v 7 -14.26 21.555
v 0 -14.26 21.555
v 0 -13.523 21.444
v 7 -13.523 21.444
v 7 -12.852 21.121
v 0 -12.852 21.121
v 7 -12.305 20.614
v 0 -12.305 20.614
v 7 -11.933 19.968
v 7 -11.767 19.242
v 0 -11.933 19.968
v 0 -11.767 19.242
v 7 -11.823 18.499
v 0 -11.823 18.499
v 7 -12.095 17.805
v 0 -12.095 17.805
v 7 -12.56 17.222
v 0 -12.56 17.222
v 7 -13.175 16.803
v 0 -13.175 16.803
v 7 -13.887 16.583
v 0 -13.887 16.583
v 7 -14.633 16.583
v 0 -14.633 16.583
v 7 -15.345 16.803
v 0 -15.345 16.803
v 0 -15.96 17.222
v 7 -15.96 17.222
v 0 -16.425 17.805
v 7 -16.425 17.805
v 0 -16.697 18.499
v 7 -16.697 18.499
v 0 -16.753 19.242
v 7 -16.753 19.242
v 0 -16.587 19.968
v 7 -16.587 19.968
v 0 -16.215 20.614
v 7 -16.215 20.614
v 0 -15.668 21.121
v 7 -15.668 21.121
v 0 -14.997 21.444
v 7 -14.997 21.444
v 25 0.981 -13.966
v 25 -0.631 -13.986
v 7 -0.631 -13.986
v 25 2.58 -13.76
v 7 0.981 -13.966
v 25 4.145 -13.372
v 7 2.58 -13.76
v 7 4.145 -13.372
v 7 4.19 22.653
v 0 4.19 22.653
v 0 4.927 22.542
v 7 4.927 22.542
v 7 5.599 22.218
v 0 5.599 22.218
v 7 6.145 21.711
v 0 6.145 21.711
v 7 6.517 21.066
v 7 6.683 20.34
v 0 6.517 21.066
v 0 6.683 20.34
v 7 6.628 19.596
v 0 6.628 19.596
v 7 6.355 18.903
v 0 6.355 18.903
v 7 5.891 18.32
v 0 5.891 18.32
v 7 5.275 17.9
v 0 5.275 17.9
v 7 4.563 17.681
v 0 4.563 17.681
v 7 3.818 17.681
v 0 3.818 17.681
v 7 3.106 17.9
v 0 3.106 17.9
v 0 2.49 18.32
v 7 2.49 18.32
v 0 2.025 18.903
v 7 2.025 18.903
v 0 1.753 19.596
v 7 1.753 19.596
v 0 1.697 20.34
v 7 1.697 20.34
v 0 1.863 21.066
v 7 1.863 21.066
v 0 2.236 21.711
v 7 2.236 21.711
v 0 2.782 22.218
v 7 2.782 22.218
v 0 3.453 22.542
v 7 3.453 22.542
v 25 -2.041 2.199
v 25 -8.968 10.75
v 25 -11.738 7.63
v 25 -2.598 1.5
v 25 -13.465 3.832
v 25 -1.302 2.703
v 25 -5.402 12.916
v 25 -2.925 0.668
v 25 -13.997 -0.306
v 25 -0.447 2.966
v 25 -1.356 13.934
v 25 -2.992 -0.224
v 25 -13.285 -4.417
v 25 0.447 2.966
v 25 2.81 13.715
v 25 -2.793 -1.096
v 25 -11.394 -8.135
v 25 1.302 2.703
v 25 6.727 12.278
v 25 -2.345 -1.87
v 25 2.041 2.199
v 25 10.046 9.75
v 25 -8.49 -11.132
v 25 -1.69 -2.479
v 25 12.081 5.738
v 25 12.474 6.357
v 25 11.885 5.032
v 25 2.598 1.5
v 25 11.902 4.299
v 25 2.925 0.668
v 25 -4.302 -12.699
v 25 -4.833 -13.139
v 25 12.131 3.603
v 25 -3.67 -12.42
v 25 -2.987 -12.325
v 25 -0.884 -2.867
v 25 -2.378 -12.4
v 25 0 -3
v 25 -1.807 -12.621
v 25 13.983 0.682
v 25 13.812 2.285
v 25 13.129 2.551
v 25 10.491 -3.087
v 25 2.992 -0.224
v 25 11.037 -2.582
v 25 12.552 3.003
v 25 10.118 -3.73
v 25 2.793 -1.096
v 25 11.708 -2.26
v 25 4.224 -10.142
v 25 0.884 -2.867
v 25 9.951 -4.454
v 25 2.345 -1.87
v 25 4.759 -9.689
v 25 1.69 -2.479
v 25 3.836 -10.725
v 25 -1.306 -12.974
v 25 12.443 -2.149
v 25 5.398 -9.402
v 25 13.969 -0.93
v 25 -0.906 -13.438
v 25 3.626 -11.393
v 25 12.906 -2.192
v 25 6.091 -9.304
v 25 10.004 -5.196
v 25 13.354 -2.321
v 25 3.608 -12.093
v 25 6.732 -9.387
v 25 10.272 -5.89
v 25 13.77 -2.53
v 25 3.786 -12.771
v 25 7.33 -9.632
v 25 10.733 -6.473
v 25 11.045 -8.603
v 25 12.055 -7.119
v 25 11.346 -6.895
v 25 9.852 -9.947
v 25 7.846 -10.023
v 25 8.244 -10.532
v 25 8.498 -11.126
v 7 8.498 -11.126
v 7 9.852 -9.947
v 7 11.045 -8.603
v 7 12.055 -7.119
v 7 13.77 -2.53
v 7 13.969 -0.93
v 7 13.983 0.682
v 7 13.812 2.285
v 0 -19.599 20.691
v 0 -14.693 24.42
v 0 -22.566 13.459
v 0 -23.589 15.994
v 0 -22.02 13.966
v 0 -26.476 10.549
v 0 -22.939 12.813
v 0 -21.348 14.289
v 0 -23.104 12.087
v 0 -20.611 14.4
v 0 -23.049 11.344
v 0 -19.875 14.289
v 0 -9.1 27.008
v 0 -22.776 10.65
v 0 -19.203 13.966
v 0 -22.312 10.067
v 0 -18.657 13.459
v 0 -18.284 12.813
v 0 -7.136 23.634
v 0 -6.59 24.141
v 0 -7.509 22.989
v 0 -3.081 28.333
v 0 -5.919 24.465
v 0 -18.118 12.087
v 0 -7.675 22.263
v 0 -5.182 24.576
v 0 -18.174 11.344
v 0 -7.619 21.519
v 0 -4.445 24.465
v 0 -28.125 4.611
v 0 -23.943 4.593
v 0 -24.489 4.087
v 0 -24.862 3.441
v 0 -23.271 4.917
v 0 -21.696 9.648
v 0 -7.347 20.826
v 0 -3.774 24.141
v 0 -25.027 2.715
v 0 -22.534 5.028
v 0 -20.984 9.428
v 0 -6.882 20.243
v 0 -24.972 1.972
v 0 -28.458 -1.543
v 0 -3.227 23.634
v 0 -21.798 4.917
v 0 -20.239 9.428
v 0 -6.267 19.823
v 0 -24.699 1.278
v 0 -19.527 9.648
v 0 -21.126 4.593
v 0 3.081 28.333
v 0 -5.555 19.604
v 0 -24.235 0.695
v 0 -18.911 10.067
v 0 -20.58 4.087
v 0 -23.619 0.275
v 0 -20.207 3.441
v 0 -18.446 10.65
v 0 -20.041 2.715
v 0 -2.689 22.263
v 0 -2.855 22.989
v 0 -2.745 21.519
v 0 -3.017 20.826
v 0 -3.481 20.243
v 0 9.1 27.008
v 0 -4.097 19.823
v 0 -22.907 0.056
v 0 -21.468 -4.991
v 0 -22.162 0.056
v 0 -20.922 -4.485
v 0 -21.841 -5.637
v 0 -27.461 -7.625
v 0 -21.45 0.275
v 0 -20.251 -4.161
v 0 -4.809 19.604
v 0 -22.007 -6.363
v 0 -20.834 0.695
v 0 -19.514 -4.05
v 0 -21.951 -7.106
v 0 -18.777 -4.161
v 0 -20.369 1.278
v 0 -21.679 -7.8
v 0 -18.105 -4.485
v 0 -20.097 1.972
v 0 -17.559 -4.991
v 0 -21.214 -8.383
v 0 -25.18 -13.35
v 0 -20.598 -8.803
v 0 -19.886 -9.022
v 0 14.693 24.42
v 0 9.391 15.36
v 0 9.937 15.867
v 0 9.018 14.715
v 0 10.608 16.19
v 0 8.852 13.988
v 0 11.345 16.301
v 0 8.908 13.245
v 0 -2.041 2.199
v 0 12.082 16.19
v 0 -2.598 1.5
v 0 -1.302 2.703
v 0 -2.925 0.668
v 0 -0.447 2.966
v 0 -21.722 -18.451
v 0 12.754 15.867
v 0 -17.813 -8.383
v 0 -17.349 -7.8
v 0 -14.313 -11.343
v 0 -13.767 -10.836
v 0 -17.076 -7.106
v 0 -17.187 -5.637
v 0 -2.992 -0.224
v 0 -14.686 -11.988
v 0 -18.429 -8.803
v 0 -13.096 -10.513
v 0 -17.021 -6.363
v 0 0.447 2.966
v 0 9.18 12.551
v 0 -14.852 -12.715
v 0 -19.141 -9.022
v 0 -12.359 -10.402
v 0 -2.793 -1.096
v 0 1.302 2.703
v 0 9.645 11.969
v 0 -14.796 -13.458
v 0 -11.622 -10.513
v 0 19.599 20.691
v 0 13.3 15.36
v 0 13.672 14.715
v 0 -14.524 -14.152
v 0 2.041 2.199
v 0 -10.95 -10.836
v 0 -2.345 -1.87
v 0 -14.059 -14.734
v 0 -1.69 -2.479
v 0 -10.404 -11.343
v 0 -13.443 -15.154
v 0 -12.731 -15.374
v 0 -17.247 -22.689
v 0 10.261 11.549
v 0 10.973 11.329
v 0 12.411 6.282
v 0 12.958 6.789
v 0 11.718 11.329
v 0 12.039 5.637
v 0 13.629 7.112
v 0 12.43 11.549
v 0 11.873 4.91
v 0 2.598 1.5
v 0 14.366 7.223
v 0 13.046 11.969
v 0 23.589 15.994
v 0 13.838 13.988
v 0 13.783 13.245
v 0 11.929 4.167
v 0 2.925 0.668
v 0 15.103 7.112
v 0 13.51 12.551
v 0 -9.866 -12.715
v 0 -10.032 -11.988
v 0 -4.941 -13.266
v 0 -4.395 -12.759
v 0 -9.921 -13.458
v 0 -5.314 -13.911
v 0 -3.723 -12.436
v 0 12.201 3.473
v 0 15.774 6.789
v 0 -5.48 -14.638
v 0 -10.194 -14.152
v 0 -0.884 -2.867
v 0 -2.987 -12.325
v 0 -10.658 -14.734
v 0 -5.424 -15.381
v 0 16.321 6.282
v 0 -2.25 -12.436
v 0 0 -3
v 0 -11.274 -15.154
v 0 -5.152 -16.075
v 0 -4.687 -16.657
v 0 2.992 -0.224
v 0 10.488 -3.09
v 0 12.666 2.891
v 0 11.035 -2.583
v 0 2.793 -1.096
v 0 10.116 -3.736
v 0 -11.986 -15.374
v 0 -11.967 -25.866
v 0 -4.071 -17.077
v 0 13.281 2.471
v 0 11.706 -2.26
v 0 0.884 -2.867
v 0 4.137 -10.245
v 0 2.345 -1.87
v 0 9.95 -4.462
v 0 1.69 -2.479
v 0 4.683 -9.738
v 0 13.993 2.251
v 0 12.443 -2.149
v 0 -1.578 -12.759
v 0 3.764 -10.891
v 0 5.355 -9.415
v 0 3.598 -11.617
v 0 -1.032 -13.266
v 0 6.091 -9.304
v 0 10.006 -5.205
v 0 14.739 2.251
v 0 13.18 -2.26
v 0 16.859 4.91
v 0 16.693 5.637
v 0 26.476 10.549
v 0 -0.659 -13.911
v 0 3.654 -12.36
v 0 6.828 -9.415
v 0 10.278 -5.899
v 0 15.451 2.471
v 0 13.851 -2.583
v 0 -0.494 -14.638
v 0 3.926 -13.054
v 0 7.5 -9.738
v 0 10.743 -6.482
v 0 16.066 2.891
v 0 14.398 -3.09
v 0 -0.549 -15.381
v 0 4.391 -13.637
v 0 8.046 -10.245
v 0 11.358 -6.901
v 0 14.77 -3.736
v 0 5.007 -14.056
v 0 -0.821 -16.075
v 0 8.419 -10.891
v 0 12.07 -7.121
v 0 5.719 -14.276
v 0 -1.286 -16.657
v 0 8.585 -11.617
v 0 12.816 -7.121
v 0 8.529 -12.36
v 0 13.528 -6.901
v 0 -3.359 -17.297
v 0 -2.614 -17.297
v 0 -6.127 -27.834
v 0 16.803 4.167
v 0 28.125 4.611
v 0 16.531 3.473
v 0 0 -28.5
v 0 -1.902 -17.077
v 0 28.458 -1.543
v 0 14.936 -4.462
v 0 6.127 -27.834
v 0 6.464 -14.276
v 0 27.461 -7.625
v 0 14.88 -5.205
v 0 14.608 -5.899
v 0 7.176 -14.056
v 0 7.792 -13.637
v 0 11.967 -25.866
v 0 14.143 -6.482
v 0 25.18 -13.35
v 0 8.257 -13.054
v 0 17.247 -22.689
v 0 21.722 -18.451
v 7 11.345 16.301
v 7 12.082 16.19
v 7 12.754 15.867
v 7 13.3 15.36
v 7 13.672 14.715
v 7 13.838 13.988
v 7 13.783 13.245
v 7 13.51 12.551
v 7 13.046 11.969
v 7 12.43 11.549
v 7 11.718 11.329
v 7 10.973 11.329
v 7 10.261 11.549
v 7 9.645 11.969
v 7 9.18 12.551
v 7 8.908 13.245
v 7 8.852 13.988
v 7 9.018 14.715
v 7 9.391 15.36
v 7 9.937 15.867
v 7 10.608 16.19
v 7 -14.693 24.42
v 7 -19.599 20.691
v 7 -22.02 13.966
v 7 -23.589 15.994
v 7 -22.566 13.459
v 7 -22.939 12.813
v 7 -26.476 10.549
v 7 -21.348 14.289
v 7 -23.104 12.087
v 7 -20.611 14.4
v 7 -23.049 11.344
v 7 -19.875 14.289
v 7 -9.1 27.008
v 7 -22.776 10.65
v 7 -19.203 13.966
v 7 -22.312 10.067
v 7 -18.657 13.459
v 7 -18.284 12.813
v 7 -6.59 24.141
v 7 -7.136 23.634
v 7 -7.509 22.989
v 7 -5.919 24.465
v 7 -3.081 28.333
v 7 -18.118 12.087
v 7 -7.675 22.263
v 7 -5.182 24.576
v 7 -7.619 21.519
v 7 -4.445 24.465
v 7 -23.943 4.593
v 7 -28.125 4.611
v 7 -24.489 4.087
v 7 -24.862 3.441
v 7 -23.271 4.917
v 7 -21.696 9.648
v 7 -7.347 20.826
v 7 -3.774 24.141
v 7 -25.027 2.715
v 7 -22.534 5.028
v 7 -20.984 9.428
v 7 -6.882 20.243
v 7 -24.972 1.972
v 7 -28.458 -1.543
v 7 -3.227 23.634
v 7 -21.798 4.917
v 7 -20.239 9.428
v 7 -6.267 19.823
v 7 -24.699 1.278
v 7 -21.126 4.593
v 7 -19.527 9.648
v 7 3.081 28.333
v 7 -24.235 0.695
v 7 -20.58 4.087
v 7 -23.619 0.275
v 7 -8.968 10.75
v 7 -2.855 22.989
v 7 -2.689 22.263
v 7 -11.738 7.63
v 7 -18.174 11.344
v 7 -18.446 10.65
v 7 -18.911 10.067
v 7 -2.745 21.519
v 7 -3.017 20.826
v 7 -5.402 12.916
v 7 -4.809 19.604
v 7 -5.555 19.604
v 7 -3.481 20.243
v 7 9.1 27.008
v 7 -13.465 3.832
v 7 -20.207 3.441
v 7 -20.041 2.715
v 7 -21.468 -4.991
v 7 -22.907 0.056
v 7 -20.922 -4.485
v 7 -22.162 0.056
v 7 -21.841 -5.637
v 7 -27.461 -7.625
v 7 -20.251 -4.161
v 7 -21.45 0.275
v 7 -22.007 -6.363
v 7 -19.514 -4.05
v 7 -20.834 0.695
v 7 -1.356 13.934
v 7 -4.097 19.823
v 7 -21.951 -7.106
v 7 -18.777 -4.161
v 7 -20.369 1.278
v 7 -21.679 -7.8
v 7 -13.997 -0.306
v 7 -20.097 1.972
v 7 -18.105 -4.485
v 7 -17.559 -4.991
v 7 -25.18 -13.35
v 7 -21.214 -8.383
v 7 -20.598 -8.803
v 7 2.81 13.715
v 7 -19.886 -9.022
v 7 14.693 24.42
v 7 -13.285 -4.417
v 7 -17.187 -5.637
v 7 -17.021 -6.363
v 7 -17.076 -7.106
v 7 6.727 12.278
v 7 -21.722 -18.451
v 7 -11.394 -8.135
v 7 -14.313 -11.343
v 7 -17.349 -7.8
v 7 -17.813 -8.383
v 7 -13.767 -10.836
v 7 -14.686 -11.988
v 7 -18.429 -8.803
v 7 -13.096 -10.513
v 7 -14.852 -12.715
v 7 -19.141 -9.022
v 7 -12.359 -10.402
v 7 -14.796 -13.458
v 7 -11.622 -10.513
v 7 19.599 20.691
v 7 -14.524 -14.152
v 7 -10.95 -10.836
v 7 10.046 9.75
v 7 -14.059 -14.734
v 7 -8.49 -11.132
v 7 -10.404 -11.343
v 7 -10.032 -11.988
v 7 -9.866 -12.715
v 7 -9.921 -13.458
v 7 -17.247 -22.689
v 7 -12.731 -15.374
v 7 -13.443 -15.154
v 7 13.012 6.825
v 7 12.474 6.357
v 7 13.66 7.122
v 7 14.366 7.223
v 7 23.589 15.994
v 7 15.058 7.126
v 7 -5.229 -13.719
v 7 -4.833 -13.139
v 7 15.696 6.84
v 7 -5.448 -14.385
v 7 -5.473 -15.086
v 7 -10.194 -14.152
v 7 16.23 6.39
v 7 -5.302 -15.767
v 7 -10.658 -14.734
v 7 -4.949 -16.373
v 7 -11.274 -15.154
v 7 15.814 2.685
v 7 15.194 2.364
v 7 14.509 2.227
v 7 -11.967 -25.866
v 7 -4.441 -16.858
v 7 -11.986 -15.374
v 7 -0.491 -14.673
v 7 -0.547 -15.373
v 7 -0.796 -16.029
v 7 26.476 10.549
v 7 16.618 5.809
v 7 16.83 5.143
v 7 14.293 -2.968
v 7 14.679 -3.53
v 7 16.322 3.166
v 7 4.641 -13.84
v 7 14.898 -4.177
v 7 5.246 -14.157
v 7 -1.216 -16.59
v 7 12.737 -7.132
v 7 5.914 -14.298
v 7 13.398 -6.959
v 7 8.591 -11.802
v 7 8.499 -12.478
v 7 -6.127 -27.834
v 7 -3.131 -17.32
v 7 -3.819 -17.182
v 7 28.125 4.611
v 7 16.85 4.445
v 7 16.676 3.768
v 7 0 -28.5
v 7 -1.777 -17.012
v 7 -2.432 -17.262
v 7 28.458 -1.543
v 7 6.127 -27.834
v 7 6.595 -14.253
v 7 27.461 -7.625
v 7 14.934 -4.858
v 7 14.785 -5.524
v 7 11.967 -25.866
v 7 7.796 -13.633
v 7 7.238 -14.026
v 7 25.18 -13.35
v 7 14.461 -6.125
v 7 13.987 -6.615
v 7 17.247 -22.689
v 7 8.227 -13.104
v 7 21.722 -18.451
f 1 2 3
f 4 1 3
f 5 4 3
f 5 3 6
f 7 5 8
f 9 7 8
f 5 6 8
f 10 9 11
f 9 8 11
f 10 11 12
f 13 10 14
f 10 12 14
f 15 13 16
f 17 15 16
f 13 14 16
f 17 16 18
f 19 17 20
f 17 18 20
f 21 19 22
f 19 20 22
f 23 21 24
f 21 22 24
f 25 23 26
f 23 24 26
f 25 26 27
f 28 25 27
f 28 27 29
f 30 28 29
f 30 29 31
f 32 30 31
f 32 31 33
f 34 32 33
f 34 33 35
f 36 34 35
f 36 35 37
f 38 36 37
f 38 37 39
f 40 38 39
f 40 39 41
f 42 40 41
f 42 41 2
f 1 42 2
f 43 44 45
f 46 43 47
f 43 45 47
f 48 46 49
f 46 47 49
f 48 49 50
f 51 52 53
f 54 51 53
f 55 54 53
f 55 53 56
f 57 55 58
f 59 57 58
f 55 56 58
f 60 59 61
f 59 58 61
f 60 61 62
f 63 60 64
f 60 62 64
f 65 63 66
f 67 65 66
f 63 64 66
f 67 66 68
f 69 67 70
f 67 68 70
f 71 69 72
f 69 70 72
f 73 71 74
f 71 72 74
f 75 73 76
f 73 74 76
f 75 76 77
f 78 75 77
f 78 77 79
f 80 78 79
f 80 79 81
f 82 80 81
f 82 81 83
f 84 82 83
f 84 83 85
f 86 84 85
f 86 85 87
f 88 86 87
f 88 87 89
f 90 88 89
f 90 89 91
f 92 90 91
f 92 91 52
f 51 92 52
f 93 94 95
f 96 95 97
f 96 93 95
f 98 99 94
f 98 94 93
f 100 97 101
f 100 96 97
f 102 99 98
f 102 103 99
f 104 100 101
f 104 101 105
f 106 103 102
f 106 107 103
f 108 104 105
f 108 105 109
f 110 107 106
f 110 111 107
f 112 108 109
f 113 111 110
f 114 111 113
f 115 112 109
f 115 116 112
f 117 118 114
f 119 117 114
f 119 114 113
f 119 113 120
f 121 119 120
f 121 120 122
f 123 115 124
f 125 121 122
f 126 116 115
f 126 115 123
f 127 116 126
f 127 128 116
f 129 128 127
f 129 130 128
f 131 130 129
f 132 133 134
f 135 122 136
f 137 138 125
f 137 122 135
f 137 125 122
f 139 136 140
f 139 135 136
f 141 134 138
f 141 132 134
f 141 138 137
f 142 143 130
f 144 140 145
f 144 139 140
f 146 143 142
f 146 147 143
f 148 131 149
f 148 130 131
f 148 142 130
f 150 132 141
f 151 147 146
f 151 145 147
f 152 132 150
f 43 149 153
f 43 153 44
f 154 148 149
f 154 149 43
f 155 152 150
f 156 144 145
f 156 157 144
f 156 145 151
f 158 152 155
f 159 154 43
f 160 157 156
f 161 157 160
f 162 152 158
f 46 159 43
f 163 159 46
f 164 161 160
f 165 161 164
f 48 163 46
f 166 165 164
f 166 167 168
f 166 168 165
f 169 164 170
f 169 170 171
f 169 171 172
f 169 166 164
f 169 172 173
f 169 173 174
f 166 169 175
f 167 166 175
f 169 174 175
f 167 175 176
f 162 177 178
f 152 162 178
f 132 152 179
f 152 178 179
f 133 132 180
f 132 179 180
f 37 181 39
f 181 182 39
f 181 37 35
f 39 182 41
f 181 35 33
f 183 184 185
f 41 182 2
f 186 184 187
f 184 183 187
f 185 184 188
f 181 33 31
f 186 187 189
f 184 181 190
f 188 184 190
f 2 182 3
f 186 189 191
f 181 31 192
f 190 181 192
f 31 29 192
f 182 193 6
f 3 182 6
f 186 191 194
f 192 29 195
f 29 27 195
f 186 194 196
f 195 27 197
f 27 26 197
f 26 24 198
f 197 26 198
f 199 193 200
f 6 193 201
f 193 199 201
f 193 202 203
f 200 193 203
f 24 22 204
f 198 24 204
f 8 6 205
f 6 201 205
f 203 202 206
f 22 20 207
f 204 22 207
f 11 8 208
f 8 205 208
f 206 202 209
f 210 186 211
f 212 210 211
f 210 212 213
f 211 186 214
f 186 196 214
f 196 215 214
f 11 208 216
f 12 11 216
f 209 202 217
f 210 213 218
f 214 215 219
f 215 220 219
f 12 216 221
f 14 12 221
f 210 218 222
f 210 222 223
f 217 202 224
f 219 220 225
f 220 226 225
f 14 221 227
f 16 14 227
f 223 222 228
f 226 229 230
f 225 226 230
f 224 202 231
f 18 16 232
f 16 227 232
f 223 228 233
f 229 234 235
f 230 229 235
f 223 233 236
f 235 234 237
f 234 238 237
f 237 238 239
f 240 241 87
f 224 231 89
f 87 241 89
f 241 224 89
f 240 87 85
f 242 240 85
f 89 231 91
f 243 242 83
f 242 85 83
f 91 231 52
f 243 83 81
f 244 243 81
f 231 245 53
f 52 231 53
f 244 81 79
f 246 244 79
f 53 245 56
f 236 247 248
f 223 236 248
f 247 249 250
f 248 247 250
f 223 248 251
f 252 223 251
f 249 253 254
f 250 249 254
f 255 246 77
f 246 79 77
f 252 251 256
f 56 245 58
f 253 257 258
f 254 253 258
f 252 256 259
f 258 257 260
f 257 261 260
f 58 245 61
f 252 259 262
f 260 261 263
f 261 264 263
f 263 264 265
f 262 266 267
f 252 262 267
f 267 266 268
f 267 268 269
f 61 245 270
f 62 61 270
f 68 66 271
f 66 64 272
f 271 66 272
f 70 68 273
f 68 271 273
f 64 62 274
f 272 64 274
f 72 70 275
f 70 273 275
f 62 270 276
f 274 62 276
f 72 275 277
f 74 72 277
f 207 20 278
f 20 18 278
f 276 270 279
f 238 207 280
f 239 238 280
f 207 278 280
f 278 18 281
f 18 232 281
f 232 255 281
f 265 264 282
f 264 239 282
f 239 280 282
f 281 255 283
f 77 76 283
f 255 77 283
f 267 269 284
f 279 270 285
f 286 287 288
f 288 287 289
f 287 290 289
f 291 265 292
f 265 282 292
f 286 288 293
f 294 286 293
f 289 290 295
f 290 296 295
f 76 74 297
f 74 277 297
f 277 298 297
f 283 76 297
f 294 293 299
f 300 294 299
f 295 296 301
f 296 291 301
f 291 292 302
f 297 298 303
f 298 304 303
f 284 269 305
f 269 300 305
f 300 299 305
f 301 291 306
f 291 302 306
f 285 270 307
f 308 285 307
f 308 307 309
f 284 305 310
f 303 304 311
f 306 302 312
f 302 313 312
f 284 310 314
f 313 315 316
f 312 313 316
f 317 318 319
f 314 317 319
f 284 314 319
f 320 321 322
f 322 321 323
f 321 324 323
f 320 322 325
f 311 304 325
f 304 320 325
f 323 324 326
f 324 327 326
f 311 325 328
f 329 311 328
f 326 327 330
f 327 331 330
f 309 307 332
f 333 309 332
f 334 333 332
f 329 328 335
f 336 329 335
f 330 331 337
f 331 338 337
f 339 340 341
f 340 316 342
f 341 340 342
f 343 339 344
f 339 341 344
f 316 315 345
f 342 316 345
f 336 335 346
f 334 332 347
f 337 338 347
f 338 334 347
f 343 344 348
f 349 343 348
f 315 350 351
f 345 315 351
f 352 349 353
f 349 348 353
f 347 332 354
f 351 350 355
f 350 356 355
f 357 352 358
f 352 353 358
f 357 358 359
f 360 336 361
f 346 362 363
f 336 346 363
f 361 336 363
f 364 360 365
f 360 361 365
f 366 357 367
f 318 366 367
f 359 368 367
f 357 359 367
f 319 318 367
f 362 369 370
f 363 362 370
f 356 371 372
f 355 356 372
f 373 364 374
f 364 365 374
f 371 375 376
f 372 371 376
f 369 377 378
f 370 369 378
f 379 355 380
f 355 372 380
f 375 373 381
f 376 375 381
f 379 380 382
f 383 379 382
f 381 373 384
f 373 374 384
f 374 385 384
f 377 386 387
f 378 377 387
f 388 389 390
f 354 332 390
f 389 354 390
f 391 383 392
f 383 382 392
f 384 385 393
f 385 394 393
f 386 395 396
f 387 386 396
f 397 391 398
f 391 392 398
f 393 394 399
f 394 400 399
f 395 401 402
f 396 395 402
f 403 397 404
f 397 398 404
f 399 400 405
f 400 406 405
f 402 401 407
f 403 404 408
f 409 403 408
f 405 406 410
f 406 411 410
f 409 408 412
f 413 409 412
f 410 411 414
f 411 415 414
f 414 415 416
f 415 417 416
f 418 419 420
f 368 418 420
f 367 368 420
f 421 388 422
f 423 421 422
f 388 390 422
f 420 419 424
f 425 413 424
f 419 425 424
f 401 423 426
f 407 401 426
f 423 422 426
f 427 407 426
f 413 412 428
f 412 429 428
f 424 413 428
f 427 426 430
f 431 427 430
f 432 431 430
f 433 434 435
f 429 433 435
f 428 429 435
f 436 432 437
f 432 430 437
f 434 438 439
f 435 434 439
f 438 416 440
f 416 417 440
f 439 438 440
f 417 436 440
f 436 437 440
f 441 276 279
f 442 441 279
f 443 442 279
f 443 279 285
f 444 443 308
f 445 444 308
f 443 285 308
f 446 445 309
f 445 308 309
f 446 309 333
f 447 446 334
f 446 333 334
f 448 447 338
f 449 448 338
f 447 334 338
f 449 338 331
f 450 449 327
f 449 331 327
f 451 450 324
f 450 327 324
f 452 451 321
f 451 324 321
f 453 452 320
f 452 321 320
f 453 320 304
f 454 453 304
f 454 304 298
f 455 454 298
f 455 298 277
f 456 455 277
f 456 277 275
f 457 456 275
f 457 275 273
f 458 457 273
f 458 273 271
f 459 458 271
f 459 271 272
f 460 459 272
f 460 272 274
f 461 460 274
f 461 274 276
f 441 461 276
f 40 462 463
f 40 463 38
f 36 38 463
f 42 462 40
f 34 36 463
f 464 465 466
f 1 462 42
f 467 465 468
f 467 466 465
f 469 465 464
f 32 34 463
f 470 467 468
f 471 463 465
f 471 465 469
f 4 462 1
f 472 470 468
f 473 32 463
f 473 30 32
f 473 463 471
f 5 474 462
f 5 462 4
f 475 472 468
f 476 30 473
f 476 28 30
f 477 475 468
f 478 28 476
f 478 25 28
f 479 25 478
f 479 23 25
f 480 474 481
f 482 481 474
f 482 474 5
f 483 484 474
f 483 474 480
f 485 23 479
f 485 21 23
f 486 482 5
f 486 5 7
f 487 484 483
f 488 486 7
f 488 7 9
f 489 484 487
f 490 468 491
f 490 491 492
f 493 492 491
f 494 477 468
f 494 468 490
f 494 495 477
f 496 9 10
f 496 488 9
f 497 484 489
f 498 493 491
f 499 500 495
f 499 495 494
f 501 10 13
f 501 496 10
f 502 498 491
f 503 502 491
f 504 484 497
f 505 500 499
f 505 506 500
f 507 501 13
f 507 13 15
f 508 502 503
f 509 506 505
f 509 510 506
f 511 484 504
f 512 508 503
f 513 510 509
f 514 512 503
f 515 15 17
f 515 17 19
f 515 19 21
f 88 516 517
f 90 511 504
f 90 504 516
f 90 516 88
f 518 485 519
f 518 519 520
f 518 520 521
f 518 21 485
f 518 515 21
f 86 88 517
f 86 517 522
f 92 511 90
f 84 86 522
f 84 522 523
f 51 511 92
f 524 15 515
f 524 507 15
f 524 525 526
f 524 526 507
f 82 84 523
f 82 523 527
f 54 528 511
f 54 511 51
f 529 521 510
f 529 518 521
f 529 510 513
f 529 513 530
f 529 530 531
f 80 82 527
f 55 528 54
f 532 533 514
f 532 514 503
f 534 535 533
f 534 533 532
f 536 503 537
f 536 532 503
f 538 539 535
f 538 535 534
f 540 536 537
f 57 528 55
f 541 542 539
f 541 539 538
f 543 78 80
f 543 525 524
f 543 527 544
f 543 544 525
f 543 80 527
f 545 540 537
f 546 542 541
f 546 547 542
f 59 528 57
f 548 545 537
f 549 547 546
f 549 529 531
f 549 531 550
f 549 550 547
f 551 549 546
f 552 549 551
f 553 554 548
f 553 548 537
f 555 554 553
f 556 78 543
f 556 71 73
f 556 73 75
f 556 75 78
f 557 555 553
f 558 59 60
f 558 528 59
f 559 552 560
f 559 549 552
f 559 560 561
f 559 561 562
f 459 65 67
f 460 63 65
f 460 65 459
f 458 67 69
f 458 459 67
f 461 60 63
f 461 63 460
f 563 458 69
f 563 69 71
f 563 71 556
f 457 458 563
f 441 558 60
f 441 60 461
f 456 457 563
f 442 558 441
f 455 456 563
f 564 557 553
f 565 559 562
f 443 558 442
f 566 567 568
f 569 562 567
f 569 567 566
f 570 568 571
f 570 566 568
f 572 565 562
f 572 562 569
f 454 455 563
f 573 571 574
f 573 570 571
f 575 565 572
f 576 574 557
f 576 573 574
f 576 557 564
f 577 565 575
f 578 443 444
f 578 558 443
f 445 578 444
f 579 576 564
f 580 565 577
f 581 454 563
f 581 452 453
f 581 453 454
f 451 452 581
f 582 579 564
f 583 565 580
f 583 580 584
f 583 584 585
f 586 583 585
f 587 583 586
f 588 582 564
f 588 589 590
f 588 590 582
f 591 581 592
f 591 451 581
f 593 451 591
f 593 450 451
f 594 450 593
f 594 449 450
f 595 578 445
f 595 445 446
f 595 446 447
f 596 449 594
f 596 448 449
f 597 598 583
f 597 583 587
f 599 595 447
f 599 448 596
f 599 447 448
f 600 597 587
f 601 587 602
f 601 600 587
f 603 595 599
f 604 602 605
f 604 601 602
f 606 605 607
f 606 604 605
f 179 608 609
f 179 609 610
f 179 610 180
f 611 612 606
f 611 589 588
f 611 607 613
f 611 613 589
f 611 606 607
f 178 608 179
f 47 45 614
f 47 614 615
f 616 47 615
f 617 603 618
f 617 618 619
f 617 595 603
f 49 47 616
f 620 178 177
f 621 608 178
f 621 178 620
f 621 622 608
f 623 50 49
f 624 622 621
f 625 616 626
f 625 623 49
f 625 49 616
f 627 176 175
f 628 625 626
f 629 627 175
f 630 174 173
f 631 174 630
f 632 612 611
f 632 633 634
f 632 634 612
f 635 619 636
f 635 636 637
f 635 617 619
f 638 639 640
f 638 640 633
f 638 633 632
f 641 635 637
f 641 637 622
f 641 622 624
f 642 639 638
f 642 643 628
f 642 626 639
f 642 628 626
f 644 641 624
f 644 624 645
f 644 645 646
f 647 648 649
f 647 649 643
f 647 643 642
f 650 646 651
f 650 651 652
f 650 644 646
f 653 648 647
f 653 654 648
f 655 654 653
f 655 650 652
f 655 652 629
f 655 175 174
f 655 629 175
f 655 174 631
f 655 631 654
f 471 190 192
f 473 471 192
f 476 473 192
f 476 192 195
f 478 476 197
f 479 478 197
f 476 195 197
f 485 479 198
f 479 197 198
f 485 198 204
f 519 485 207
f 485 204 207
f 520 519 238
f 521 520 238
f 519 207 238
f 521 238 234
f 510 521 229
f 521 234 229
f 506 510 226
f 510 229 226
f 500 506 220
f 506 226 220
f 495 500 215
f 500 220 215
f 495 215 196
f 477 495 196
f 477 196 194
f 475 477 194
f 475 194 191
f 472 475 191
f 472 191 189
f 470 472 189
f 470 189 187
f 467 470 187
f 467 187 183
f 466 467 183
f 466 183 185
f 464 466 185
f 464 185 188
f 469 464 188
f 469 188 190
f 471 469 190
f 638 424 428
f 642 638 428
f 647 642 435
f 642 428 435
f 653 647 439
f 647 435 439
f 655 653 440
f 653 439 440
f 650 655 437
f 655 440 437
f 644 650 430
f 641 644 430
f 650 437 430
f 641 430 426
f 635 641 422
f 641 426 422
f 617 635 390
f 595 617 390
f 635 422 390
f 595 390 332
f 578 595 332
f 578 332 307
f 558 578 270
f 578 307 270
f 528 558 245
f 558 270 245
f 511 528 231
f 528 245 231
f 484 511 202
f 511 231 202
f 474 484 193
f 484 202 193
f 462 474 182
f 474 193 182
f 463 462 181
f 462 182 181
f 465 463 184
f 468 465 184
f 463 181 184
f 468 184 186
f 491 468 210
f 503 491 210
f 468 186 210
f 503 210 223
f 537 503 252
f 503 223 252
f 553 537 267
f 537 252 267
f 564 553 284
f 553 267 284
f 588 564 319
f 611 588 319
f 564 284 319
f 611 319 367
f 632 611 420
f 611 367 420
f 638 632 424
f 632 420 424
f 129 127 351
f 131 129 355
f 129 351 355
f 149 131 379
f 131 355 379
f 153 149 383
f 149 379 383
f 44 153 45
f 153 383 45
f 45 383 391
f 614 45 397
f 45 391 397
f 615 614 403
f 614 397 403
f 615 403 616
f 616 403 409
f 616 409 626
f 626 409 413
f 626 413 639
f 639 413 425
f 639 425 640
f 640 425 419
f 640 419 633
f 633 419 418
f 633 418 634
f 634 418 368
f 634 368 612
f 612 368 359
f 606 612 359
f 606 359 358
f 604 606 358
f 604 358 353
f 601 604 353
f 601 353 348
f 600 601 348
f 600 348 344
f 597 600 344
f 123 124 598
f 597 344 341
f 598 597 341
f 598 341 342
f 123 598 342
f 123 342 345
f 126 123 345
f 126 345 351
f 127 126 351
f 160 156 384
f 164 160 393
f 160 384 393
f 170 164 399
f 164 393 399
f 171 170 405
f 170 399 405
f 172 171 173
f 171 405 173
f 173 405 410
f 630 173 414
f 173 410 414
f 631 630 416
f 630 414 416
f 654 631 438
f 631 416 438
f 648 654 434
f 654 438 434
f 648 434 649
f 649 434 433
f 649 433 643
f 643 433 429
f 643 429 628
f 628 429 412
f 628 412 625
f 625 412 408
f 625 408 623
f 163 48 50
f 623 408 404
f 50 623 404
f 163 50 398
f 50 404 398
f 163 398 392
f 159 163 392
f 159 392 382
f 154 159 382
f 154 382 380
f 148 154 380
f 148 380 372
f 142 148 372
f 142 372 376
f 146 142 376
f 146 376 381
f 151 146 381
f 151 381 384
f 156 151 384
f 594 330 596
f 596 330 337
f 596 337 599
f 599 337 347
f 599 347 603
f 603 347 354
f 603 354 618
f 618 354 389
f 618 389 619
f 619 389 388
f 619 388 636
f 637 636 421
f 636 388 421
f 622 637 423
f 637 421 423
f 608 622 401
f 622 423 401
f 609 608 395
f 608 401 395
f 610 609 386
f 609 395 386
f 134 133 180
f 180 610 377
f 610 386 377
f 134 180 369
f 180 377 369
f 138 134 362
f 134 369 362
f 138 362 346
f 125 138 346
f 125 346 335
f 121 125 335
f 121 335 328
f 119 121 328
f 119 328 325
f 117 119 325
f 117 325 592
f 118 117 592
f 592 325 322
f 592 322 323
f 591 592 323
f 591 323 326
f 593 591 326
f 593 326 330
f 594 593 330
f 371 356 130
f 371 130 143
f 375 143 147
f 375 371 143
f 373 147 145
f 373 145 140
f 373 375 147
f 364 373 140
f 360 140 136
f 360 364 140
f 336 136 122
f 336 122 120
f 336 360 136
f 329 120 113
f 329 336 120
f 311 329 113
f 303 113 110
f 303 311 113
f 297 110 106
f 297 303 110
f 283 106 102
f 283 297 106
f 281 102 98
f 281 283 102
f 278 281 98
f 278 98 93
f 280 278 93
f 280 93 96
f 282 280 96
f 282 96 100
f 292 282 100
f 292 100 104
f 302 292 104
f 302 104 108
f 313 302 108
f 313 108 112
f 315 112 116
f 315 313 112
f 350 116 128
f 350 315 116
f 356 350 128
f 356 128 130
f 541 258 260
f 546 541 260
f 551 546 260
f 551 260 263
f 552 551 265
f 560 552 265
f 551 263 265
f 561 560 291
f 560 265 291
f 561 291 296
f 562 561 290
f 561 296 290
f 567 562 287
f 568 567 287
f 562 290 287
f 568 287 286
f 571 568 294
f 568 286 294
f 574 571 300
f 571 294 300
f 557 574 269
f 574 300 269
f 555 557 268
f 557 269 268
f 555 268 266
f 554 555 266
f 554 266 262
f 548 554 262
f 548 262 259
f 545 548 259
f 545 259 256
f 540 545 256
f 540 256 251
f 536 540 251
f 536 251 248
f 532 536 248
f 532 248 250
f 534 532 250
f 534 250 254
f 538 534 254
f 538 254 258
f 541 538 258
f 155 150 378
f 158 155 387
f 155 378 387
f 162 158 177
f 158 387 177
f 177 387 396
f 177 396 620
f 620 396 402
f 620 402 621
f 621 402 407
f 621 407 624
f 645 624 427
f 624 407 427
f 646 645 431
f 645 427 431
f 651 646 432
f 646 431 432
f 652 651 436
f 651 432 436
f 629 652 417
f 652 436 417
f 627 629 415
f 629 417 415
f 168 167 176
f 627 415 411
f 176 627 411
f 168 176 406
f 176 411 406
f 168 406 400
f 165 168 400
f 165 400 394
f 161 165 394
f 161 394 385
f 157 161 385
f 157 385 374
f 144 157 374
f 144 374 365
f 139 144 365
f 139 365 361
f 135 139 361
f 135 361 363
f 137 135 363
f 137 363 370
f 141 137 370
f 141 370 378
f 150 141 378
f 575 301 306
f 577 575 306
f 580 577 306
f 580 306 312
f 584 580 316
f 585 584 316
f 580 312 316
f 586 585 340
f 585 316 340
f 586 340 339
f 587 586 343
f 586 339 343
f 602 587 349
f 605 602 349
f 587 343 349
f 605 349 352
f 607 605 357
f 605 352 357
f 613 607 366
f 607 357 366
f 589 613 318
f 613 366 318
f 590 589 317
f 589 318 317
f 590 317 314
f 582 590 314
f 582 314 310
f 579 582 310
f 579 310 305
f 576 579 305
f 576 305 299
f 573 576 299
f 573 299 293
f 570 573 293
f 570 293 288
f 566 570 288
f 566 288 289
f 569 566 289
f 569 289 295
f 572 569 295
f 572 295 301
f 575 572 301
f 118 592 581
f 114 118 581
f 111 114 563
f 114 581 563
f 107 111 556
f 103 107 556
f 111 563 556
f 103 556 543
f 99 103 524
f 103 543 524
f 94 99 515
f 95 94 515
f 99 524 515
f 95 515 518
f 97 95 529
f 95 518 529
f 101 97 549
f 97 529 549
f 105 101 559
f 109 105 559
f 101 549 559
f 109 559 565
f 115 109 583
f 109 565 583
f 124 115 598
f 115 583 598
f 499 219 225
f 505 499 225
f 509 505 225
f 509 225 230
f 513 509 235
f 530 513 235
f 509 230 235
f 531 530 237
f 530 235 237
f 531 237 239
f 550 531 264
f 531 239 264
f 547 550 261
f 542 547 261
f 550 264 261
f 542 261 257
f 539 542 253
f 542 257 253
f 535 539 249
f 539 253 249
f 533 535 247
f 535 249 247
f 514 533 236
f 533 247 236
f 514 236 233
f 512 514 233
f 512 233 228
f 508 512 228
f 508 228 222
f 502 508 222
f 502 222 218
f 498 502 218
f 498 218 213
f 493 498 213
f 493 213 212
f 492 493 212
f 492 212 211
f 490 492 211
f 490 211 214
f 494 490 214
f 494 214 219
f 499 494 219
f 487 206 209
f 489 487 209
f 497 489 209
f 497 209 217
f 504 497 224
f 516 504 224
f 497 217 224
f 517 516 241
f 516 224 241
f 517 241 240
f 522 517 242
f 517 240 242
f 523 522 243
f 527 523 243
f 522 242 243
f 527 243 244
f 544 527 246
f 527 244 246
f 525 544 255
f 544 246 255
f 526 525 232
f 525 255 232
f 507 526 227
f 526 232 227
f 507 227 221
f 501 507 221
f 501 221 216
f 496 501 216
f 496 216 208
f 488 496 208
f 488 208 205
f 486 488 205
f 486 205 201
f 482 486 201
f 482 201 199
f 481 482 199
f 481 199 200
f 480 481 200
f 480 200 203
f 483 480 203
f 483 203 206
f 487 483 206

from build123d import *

# Parameters (mm, degrees)
SKETCH1_R               = 28.5
SKETCH1_R_2             = 14
BOSS_EXTRUDE1_DEPTH     = 7
SKETCH1_4_R             = 14
SKETCH1_4_R_2           = 3
BOSS_EXTRUDE2_DEPTH     = 25
SKETCH3_R               = 2.5
CUT_EXTRUDE1_DEPTH      = 1
CUT_EXTRUDE1_DEPTH_BACK = 26


with BuildPart() as part:
    # Sketch1 → Boss-Extrude1 (new body)
    with BuildSketch(Plane(origin=(0, 0, 0), x_dir=(0, 0, -1), z_dir=(1, 0, 0))):
        Circle(SKETCH1_R)
        Circle(SKETCH1_R_2, mode=Mode.SUBTRACT)
    extrude(amount=BOSS_EXTRUDE1_DEPTH)

    # Sketch1<4> → Boss-Extrude2 (add)
    with BuildSketch(Plane(origin=(0, 0, 0), x_dir=(0, 0, -1), z_dir=(1, 0, 0))):
        Circle(SKETCH1_4_R)
        Circle(SKETCH1_4_R_2, mode=Mode.SUBTRACT)
    extrude(amount=BOSS_EXTRUDE2_DEPTH)

    # Sketch3 → Cut-Extrude1 (cut, two sides)
    with BuildSketch(Plane.ZY) as cut_extrude1_sk:
        with Locations((19.055020887, -14.259950175)):
            Circle(SKETCH3_R)
        with Locations((11.9, -20.61140461)):
            Circle(SKETCH3_R)
        with Locations((2.52784293, -22.534415058)):
            Circle(SKETCH3_R)
        with Locations((-6.550188406, -19.513712423)):
            Circle(SKETCH3_R)
        with Locations((-12.901642841, -12.358691536)):
            Circle(SKETCH3_R)
        with Locations((-14.824653289, -2.986534466)):
            Circle(SKETCH3_R)
        with Locations((-11.803950653, 6.09149687)):
            Circle(SKETCH3_R)
        with Locations((-4.648929766, 12.442951305)):
            Circle(SKETCH3_R)
        with Locations((4.723227304, 14.365961753)):
            Circle(SKETCH3_R)
        with Locations((13.801258639, 11.345259118)):
            Circle(SKETCH3_R)
        with Locations((20.152713074, 4.19023823)):
            Circle(SKETCH3_R)
        with Locations((22.075723522, -5.18191884)):
            Circle(SKETCH3_R)
    extrude(amount=CUT_EXTRUDE1_DEPTH, mode=Mode.SUBTRACT)
    extrude(cut_extrude1_sk.sketch, amount=-CUT_EXTRUDE1_DEPTH_BACK, mode=Mode.SUBTRACT)


solid = part.part
